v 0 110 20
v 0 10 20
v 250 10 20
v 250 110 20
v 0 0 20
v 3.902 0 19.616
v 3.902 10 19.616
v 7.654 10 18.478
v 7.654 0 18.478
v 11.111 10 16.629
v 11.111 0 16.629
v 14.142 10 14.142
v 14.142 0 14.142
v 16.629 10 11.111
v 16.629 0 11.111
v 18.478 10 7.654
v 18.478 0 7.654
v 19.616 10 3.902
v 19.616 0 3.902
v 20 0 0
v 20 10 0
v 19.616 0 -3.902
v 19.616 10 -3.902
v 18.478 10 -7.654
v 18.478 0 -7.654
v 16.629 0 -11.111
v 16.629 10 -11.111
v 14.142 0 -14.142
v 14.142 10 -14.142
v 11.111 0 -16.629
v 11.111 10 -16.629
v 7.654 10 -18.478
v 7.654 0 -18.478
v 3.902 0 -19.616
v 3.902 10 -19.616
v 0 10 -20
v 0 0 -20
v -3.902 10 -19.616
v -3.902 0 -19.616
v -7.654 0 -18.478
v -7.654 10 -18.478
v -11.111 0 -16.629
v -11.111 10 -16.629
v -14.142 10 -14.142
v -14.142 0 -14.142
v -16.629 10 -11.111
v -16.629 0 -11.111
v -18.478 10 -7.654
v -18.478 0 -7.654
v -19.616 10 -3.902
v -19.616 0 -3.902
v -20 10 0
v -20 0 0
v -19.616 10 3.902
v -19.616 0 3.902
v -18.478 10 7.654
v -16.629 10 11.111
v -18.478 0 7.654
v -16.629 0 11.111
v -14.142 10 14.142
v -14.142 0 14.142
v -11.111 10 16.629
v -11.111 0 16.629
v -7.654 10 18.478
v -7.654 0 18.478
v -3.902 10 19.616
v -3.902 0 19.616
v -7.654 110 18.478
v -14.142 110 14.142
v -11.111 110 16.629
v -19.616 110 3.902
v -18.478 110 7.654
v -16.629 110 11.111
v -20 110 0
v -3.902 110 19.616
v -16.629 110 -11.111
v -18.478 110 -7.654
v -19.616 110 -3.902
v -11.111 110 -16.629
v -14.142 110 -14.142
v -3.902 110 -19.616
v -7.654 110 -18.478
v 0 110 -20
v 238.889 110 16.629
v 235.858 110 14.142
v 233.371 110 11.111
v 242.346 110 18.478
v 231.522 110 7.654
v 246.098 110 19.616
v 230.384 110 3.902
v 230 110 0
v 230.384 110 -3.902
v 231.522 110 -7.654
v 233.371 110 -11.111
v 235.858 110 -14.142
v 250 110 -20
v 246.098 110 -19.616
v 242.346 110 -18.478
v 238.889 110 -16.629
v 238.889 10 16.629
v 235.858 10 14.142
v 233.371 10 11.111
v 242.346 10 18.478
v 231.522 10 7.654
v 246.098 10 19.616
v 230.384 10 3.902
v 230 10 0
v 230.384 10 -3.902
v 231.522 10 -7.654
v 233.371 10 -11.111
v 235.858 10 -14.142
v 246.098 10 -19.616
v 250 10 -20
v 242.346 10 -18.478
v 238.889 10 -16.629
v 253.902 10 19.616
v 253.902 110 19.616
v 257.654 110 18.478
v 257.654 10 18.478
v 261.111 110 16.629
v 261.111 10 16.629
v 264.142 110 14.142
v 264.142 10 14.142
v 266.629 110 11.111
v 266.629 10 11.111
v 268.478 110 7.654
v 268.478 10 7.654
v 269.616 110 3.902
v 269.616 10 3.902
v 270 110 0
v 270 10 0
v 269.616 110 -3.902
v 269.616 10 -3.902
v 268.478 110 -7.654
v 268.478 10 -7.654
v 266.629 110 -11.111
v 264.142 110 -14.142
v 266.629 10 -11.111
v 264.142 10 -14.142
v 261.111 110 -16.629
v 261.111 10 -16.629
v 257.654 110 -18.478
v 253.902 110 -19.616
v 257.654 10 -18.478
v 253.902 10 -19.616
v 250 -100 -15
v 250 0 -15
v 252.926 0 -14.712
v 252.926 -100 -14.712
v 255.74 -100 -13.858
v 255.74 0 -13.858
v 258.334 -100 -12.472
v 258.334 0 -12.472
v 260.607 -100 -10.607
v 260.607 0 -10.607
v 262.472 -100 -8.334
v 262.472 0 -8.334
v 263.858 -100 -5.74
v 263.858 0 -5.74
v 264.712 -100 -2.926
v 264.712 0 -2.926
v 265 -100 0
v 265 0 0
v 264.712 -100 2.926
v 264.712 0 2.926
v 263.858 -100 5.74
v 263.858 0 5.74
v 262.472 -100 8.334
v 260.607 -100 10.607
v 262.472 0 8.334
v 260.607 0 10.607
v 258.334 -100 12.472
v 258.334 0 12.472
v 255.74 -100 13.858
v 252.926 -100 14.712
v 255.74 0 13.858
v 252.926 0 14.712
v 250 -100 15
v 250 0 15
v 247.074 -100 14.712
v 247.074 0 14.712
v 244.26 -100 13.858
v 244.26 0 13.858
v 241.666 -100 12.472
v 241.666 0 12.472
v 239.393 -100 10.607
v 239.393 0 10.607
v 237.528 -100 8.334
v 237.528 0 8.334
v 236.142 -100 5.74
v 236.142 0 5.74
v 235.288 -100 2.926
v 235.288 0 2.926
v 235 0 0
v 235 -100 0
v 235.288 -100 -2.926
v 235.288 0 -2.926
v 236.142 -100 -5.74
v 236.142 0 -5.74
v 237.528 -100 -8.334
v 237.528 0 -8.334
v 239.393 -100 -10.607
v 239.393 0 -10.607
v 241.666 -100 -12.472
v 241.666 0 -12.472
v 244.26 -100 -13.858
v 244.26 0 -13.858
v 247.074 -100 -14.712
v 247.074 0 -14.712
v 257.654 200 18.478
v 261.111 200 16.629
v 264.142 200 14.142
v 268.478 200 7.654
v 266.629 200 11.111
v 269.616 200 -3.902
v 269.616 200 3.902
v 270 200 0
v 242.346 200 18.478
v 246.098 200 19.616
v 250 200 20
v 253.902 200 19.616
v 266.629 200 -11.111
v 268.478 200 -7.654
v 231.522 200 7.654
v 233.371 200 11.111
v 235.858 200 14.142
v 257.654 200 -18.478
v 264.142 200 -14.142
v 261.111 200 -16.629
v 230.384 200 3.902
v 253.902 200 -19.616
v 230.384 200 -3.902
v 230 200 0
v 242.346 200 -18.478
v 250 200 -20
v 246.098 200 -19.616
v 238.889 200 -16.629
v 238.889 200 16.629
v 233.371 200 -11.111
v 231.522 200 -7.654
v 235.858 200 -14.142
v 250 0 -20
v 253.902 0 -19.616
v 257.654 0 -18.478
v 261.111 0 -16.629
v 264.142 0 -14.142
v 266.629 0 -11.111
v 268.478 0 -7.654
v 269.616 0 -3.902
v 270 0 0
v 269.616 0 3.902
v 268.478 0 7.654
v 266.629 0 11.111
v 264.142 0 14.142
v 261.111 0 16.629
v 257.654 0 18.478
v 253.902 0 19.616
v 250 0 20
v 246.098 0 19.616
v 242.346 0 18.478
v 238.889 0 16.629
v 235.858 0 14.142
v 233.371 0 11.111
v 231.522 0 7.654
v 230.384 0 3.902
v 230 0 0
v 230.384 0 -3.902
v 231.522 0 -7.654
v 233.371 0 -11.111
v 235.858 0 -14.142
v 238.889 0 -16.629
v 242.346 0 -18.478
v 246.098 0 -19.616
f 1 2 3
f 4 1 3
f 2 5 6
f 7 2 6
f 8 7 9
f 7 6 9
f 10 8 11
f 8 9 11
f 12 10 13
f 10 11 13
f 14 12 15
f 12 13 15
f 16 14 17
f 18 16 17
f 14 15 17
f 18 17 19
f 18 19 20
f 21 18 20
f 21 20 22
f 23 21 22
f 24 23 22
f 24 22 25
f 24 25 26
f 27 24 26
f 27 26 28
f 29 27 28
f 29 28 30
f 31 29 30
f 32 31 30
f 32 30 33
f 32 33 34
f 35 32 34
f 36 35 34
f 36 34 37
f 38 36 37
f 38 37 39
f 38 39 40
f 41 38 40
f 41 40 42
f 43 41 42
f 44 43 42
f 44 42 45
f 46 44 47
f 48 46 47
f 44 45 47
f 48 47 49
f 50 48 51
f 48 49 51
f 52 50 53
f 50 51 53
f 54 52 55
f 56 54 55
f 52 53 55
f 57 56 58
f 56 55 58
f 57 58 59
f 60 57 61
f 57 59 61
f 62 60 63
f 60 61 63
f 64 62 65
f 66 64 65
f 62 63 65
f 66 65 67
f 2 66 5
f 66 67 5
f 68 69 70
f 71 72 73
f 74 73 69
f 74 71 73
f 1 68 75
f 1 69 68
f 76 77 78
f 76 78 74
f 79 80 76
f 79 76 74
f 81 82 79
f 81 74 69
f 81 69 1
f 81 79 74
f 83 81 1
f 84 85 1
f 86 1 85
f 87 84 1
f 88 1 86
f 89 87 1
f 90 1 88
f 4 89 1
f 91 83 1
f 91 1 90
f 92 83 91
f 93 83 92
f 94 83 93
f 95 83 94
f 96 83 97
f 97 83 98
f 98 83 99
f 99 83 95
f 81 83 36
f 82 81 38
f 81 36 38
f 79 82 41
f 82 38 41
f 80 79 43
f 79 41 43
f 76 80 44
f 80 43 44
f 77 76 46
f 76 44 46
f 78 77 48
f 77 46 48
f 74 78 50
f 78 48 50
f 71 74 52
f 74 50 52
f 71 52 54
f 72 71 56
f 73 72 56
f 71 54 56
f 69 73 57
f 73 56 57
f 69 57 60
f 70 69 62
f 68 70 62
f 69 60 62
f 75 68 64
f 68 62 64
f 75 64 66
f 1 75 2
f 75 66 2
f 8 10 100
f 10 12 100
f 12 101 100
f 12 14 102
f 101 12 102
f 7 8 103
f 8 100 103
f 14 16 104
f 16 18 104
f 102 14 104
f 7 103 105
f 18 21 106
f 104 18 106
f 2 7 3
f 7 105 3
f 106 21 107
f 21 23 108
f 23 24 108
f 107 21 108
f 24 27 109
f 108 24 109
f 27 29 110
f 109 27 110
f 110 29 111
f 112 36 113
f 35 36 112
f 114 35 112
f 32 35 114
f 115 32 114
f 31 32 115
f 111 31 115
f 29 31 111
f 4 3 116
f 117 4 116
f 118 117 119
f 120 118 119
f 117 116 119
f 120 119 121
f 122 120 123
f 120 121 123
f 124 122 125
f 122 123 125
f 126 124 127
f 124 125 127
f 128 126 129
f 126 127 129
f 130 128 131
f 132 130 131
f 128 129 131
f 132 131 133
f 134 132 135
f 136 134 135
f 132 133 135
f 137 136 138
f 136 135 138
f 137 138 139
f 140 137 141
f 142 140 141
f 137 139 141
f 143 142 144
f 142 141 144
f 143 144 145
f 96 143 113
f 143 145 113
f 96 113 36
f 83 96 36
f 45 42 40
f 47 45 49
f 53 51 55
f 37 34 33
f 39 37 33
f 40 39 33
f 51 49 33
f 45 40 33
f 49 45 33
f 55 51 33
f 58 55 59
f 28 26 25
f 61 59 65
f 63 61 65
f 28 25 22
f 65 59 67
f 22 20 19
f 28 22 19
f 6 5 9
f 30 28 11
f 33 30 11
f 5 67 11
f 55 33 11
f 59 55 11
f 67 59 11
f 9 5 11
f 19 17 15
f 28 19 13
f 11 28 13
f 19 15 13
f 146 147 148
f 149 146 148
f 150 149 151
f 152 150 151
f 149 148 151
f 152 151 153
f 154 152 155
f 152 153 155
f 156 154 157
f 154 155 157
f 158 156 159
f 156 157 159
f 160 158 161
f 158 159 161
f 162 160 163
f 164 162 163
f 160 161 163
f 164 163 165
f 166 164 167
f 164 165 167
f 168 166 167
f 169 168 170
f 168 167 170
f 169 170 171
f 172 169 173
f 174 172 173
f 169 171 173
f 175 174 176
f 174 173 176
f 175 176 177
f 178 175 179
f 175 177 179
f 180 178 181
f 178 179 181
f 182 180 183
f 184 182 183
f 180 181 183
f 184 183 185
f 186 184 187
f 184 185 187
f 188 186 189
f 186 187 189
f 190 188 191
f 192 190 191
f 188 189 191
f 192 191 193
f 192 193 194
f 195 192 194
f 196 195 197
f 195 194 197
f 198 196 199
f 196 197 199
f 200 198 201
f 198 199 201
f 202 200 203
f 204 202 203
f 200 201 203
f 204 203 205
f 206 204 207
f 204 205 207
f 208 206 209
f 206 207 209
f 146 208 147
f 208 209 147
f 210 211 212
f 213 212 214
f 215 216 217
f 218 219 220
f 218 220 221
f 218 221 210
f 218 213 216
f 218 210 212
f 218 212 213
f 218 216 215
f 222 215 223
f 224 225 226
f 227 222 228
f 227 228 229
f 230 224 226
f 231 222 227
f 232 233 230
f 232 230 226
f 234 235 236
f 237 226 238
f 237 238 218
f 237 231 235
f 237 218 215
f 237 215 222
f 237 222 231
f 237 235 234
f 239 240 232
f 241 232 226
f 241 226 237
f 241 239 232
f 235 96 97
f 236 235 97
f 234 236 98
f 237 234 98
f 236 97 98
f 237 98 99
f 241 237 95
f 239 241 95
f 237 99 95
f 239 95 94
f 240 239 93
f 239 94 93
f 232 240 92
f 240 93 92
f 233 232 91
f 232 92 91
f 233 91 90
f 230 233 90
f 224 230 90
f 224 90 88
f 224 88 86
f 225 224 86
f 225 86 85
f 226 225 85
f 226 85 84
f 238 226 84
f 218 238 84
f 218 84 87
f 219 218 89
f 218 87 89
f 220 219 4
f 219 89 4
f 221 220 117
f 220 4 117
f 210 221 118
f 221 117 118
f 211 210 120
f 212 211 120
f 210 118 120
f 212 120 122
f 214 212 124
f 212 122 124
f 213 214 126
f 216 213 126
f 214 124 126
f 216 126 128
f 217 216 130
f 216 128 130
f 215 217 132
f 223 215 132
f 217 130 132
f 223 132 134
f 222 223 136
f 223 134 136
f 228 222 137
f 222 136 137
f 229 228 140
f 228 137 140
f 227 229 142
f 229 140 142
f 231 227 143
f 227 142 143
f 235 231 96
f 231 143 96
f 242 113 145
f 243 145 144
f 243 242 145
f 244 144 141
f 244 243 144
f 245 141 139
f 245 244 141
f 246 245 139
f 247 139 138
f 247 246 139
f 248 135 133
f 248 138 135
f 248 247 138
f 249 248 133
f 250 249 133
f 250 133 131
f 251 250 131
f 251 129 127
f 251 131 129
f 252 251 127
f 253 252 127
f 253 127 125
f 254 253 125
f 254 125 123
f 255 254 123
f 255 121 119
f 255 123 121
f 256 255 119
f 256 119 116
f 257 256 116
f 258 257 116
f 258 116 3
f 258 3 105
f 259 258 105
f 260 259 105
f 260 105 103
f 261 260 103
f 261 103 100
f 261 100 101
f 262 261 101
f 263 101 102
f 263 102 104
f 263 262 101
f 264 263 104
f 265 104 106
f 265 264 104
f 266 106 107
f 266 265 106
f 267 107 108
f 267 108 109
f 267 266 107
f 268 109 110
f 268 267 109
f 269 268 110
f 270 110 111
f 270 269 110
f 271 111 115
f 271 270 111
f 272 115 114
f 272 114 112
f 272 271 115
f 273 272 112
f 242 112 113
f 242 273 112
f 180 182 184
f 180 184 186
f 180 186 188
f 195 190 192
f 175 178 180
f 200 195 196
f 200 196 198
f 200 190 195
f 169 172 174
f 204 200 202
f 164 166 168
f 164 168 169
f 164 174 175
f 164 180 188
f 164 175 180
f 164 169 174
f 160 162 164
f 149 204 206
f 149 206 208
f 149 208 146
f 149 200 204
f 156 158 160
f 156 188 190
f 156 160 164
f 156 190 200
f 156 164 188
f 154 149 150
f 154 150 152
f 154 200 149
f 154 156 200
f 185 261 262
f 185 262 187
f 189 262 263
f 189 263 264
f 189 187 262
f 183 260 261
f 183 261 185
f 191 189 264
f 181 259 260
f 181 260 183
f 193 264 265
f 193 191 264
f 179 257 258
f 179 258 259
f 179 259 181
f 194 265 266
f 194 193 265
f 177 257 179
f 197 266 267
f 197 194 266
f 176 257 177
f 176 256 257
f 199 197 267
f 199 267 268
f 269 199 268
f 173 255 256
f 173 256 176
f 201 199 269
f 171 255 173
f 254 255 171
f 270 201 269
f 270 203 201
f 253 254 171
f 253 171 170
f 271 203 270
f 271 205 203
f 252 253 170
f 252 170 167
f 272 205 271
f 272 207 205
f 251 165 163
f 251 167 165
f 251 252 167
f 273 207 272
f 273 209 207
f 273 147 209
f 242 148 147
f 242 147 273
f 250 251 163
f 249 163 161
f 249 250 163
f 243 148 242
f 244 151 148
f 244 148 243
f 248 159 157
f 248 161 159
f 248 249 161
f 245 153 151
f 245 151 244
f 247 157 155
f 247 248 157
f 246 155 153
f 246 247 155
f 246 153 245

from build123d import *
from build123d.topology import SkipClean

# Parameters (mm, degrees)
SKETCH1_R           = 20
BOSS_EXTRUDE1_DEPTH = 10
BOSS_EXTRUDE2_DEPTH = 100
BOSS_EXTRUDE3_START = 10
SKETCH3_R           = 20
BOSS_EXTRUDE3_DEPTH = 10
SKETCH6_R           = 20
BOSS_EXTRUDE5_DEPTH = 90
SKETCH9_R           = 15
BOSS_EXTRUDE6_DEPTH = 100


with BuildPart() as part:
    # Sketch1 → Boss-Extrude1 (new body)
    with BuildSketch(Plane(origin=(0, 0, 0), x_dir=(1, 0, 0), z_dir=(0, 1, 0))):
        with Locations(Location((0, 0, 0), (0, 0, 270))):
            Circle(SKETCH1_R)
    extrude(amount=BOSS_EXTRUDE1_DEPTH)

    # Sketch2 → Boss-Extrude2 (add)
    with BuildSketch(Plane(origin=(0, 10, 0), x_dir=(1, 0, 0), z_dir=(0, 1, 0))):
        with BuildLine():
            Line((0, -20), (250, -20))
            ThreePointArc((250, -20), (270, 0), (250, 20))
            Line((250, 20), (0, 20))
            ThreePointArc((0, 20), (-20, 0), (0, -20))
        make_face()
    extrude(amount=BOSS_EXTRUDE2_DEPTH)

    # Sketch3 → Boss-Extrude3 (add)
    with SkipClean():  # the faces are left unmerged after this step: merging them gives an invalid solid
        with BuildSketch(Plane.XZ.offset(-10).offset(BOSS_EXTRUDE3_START)):
            with Locations(Location((250, 0, 0), (0, 0, 270))):
                Circle(SKETCH3_R)
        extrude(amount=-BOSS_EXTRUDE3_DEPTH)

    # Sketch6 → Boss-Extrude5 (add)
    with BuildSketch(Plane(origin=(0, 110, 0), x_dir=(1, 0, 0), z_dir=(0, 1, 0))):
        with Locations(Location((250, 0, 0), (0, 0, 90))):
            Circle(SKETCH6_R)
    extrude(amount=BOSS_EXTRUDE5_DEPTH)

    # Sketch9 → Boss-Extrude6 (add)
    with BuildSketch(Plane.XZ):
        with Locations(Location((250, 0, 0), (0, 0, 270))):
            Circle(SKETCH9_R)
    extrude(amount=BOSS_EXTRUDE6_DEPTH)


solid = part.part
